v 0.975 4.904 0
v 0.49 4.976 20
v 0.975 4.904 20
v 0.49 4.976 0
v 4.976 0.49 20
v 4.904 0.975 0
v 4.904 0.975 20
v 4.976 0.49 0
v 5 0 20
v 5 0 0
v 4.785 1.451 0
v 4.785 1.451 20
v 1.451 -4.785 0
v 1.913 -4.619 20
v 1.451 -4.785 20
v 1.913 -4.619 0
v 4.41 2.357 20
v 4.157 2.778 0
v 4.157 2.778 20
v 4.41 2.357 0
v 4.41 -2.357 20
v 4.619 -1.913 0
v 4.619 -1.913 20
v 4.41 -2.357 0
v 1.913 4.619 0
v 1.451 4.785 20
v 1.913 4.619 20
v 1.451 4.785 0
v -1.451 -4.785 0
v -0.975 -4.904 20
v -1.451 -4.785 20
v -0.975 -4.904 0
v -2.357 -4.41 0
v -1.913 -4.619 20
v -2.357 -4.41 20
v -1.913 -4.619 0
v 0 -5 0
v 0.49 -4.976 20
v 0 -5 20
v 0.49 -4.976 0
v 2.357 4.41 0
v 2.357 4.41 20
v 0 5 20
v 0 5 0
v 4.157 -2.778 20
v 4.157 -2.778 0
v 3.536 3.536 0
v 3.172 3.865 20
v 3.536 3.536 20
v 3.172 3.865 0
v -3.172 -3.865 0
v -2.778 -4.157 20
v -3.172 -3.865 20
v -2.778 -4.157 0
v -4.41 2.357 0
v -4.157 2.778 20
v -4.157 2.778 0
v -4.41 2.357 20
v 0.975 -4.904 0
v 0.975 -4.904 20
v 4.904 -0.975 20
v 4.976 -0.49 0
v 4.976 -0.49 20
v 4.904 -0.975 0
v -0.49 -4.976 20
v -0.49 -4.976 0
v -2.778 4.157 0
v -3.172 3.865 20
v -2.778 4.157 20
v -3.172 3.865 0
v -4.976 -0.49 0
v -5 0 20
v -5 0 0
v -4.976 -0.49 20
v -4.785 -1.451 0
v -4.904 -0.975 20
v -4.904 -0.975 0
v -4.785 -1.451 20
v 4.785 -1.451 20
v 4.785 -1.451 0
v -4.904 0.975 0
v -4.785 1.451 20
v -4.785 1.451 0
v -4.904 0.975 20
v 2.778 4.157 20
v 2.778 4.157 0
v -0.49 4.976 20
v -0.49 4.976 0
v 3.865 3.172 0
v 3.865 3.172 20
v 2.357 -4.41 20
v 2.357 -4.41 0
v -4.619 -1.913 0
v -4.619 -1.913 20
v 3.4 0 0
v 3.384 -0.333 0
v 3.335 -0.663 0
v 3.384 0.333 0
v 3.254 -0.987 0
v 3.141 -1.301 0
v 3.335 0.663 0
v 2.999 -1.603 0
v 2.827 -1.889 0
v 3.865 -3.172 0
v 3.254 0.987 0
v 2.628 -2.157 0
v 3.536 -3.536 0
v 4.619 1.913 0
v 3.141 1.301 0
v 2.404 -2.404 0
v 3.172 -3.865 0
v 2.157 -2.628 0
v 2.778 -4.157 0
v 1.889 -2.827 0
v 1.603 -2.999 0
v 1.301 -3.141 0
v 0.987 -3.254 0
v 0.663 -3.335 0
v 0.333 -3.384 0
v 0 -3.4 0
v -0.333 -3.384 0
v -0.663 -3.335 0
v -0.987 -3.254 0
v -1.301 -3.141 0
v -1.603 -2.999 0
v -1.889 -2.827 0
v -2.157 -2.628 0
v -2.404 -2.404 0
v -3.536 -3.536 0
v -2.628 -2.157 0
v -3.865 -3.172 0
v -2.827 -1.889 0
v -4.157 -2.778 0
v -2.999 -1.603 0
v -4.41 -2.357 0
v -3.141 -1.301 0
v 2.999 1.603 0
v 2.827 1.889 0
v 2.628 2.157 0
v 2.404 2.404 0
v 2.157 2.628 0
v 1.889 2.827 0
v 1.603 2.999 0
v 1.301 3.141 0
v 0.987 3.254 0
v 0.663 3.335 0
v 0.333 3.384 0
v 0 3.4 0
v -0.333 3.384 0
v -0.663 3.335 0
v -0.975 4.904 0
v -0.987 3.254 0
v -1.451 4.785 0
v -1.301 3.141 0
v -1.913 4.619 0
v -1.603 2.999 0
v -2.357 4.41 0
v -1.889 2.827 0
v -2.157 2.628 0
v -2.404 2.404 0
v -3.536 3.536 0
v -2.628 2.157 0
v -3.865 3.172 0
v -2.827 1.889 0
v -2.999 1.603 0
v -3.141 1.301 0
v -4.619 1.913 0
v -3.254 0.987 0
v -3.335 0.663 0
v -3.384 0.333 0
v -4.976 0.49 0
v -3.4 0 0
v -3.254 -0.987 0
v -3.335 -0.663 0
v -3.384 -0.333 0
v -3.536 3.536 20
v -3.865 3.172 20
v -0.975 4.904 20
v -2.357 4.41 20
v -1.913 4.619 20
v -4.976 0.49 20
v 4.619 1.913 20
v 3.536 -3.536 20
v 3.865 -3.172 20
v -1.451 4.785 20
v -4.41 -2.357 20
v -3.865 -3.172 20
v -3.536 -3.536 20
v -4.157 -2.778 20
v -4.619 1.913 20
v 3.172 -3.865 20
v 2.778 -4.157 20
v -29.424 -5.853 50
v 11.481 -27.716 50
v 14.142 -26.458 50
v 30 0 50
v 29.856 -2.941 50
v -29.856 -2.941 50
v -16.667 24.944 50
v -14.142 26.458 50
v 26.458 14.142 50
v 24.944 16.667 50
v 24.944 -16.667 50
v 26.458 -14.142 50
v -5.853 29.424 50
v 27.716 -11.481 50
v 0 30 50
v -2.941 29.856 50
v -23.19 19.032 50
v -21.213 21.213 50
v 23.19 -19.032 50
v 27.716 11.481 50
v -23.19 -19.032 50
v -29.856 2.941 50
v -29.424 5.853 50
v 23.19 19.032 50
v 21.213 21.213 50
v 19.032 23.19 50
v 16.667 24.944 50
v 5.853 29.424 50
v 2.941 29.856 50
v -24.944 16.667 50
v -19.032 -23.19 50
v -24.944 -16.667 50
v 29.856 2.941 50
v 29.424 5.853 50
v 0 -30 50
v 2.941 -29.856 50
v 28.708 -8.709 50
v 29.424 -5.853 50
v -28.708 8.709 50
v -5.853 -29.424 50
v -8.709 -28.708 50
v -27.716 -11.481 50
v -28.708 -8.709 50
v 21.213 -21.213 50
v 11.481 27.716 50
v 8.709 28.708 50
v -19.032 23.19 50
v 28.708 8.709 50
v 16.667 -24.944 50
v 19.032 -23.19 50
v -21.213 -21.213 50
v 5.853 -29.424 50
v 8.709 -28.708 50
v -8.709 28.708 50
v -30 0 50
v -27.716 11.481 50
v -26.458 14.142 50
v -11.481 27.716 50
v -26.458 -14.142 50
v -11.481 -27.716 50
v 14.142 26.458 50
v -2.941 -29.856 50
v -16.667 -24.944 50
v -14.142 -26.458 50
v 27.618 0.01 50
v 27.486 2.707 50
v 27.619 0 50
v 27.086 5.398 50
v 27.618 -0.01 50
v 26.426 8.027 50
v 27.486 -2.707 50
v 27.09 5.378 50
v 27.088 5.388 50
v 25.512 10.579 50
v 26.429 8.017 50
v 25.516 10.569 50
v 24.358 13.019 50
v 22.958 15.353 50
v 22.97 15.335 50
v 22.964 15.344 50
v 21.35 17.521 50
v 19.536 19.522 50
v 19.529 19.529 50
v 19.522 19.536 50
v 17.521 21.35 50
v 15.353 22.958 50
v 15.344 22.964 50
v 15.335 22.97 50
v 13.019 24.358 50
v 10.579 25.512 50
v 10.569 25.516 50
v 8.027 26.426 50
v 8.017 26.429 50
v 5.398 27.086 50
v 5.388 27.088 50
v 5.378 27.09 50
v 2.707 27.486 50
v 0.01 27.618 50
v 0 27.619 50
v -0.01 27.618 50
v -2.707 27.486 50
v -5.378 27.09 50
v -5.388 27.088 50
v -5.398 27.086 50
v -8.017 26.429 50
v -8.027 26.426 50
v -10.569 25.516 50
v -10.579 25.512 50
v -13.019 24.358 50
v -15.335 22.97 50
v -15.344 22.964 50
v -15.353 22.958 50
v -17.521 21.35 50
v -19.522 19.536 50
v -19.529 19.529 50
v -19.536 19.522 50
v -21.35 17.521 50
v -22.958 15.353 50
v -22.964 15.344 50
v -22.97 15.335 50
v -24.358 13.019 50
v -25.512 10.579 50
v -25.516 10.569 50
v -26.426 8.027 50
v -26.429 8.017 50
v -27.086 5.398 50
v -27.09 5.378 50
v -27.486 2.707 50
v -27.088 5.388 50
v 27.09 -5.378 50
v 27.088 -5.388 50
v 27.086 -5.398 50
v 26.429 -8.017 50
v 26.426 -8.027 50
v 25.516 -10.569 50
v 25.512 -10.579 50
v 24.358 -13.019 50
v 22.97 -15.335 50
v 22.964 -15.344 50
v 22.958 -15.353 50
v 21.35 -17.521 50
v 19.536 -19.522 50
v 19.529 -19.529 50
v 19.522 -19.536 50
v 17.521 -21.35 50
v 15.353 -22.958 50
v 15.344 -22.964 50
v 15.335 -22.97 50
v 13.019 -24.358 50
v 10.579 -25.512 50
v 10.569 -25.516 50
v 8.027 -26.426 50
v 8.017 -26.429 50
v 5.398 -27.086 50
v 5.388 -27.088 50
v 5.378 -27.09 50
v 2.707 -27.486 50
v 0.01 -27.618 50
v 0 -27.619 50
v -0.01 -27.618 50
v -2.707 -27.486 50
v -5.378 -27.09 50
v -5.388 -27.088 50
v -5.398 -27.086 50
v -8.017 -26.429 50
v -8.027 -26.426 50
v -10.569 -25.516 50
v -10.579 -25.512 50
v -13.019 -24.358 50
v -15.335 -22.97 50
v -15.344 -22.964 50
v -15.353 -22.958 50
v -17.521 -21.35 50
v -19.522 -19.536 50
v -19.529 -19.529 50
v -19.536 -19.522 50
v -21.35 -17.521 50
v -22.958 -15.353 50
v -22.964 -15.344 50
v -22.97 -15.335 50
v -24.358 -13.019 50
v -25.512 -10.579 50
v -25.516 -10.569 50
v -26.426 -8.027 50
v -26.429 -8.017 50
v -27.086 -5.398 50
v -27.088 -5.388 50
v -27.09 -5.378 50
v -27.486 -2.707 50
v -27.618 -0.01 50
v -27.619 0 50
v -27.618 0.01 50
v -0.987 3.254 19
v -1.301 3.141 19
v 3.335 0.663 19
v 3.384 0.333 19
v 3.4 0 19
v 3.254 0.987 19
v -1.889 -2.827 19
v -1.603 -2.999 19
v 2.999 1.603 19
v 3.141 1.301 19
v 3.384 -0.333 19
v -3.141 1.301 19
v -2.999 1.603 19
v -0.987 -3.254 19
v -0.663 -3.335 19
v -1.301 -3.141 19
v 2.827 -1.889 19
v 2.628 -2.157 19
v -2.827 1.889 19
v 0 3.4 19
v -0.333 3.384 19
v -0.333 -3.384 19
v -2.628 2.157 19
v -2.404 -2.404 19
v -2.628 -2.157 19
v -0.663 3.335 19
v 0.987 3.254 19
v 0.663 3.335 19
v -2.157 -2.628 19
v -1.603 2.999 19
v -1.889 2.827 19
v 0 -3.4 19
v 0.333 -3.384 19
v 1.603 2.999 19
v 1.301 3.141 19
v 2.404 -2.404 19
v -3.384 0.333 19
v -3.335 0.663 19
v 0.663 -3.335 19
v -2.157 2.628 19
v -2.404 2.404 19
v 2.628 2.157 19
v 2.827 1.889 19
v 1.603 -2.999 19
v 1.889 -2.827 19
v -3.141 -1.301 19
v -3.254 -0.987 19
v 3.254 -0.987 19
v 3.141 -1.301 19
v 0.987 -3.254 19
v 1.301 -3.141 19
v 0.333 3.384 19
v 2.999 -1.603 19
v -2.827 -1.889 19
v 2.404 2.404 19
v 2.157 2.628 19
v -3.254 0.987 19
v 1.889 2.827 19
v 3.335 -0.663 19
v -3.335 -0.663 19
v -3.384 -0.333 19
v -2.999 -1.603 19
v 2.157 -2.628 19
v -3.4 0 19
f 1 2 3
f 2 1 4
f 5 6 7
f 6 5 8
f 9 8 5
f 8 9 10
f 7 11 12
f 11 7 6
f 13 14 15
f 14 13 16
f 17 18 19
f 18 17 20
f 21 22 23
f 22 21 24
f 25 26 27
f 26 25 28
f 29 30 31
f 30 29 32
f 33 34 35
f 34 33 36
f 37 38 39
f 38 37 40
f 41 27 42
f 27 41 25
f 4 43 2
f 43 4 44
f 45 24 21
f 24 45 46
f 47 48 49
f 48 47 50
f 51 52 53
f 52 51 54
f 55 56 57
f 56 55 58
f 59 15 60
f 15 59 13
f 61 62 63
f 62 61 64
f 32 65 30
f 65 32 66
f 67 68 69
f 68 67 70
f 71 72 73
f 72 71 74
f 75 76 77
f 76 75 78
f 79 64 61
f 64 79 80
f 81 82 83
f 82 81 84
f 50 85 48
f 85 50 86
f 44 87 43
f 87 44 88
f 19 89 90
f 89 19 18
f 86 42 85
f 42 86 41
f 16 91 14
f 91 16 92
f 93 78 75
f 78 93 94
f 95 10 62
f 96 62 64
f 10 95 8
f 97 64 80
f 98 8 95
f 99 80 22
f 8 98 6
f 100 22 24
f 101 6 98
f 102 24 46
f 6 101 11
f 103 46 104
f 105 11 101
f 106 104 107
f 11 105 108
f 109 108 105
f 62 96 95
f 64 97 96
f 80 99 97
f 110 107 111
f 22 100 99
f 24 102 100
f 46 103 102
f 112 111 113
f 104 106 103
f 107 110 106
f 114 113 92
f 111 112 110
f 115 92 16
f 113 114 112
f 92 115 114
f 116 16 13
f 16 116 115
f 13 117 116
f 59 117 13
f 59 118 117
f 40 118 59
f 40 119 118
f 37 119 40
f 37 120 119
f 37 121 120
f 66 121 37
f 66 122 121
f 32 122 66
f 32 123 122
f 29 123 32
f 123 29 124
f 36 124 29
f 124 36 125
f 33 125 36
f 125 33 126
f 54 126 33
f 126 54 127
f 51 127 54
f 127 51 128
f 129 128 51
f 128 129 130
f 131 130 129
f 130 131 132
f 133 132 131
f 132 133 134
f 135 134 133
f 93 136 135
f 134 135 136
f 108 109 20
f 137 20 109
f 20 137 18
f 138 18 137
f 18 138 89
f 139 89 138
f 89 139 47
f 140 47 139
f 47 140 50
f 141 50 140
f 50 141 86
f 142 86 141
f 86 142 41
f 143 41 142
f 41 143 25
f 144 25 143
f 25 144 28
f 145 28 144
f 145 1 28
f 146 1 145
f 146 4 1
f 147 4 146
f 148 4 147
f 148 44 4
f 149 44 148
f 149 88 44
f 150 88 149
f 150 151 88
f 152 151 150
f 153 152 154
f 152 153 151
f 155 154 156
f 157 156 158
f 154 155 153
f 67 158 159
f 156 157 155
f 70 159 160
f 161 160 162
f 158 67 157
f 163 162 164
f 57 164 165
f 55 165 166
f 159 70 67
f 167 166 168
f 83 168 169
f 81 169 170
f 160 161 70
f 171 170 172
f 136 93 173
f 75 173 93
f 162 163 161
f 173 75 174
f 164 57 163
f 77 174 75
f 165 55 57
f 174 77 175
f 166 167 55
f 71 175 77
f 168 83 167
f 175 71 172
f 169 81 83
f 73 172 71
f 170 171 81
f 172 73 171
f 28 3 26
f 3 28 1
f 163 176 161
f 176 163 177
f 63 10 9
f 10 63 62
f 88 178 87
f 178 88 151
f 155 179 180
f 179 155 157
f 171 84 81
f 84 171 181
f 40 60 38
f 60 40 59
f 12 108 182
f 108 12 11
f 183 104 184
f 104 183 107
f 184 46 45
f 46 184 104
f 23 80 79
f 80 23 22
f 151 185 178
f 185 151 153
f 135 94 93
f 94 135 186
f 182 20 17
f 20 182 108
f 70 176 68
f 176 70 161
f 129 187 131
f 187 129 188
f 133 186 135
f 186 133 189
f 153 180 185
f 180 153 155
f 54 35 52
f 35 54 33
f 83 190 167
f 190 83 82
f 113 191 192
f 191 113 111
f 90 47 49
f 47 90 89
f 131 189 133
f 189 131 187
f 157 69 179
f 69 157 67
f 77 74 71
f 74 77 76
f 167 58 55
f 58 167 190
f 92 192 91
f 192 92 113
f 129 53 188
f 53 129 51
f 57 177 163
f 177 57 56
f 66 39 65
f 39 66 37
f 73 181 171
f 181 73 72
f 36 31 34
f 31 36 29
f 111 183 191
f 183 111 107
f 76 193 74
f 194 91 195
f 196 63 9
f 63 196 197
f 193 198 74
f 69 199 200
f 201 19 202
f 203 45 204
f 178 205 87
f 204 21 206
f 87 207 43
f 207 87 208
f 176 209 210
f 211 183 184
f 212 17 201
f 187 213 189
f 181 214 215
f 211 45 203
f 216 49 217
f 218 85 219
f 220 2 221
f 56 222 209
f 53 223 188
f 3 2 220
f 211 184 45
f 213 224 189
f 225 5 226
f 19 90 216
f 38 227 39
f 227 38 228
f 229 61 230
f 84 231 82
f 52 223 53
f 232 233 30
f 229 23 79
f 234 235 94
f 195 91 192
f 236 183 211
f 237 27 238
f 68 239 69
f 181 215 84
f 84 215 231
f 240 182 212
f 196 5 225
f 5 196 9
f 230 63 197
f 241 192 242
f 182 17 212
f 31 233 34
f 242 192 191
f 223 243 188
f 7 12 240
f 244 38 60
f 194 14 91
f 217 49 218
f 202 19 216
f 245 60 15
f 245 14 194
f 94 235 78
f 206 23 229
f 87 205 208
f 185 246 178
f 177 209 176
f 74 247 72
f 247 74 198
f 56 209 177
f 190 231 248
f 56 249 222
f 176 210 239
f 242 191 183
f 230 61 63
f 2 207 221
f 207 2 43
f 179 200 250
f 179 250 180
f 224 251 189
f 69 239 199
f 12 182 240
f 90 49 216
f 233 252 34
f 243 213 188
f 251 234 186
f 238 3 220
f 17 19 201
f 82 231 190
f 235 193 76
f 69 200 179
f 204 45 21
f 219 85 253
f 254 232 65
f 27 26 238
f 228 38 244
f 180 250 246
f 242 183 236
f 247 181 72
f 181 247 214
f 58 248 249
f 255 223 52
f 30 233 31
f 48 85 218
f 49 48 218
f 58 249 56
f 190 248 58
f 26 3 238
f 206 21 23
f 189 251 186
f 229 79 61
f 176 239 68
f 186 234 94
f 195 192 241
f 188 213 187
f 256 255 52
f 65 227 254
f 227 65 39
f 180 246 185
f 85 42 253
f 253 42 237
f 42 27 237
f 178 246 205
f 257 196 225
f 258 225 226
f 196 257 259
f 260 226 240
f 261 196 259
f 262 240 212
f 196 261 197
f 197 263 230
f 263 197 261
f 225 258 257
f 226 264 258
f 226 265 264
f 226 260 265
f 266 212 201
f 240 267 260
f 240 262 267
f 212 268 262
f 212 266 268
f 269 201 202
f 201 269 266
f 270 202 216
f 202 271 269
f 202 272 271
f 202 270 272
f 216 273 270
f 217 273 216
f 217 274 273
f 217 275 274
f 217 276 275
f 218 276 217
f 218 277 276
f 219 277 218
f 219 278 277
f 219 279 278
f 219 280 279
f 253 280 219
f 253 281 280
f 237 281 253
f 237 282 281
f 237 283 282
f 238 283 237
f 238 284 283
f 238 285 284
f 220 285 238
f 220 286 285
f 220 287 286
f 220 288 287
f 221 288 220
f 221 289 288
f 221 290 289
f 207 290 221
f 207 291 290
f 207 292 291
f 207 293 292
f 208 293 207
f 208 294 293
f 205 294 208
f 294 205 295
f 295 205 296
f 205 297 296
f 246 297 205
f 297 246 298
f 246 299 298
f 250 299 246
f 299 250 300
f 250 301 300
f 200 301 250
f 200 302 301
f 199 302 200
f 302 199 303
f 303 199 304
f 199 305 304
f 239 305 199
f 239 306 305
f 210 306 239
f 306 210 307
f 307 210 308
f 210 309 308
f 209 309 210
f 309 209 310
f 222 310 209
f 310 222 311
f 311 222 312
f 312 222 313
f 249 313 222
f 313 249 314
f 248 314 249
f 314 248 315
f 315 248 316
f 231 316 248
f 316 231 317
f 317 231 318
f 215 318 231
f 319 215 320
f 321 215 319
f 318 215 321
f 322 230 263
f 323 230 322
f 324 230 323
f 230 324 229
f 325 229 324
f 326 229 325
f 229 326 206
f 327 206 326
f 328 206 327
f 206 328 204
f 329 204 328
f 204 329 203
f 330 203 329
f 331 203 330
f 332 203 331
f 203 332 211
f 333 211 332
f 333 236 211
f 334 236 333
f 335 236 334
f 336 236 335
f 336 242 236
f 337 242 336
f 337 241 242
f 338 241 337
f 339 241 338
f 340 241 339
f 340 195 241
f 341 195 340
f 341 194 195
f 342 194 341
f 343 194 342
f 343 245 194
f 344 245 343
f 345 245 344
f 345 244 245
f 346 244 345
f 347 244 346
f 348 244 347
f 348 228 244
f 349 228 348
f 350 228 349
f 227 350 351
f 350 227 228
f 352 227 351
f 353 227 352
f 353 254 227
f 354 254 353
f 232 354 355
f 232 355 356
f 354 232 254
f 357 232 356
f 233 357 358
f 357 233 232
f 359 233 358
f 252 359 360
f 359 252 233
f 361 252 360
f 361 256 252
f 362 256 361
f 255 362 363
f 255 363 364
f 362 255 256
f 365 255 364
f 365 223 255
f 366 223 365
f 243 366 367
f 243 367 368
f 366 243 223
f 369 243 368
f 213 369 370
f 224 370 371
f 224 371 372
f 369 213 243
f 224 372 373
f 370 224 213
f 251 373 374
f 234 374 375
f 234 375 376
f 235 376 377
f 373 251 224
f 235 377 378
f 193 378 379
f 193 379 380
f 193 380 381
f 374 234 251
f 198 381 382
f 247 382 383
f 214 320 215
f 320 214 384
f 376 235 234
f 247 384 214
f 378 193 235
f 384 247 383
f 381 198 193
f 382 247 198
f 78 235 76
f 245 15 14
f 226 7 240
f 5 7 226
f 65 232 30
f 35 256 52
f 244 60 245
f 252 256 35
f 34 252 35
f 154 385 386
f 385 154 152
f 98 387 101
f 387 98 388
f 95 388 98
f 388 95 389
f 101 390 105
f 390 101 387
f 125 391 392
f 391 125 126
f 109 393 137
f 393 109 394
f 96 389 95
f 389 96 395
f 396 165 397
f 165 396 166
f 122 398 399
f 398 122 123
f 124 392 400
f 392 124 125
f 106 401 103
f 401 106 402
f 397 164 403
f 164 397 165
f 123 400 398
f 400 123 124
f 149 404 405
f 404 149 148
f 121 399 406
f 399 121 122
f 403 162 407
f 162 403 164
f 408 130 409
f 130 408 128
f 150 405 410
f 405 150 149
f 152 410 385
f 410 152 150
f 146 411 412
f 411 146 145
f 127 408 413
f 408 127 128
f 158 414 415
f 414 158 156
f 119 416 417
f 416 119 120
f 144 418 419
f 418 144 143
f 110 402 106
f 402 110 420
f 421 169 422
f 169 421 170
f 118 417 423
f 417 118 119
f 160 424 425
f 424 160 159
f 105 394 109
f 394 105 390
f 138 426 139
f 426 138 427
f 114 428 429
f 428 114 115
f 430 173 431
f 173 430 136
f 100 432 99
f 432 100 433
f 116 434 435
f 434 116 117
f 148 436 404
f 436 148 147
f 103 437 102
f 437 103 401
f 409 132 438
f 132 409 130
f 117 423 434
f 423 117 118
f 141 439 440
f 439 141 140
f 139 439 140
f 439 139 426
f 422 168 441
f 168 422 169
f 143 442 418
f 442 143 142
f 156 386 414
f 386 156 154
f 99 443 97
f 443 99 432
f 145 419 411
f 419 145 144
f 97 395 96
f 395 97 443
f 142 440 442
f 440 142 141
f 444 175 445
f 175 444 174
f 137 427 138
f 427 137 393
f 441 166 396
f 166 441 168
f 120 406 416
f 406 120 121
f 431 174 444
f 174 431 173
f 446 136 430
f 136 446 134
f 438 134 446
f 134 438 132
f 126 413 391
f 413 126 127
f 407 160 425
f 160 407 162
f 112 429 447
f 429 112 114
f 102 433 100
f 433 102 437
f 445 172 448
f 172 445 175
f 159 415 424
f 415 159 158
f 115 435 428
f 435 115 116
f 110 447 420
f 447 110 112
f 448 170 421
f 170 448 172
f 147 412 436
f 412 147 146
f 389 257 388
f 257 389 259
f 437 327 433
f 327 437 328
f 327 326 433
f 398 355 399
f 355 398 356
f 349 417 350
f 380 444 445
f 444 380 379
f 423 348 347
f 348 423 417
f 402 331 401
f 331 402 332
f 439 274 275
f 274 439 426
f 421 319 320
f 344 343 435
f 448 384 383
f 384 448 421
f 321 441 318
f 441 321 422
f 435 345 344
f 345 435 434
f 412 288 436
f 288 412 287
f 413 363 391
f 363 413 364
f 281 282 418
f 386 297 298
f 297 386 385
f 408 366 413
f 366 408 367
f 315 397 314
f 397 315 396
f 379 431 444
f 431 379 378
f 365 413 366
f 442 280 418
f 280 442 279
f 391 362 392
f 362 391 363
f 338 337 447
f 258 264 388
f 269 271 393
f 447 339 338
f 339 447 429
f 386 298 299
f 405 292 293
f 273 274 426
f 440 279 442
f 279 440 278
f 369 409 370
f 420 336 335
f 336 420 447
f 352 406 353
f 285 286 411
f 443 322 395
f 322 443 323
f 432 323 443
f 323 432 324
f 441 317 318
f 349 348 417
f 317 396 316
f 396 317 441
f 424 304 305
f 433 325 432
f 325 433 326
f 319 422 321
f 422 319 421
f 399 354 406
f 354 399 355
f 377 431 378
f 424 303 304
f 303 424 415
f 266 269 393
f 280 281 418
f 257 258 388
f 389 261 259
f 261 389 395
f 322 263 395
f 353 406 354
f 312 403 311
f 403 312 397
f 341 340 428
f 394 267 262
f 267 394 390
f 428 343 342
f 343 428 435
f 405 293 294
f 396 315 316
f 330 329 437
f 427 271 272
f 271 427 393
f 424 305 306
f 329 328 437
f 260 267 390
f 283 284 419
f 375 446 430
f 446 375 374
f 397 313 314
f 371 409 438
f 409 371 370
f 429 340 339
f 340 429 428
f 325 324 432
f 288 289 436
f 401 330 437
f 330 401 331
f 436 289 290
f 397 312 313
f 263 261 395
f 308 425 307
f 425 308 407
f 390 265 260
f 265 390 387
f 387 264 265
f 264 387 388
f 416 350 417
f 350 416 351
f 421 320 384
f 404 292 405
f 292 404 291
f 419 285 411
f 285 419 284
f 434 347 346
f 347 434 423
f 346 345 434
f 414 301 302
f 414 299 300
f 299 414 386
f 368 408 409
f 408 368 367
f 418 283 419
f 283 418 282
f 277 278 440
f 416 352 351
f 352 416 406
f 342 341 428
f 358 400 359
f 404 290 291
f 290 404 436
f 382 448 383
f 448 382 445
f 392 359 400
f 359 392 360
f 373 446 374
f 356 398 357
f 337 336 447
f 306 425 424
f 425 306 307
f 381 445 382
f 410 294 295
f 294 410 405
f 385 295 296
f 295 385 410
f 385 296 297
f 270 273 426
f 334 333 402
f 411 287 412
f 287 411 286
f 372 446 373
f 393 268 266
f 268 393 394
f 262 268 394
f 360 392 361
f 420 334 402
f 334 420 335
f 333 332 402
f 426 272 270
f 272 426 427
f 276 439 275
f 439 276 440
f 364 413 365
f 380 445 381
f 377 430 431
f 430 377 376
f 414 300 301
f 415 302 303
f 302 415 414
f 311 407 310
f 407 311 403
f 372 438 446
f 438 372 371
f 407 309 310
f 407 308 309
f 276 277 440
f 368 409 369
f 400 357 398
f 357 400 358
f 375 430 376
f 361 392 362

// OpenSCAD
// Small lab funnel – printed upright, wide opening at top.
// All dimensions in mm, taken directly from the spec.

$fn = 64;

// ---- Named dimensions (measured with calipers) ----
spout_od   = 10;   // spout outer diameter
spout_h    = 20;   // spout height (z = 0 .. 20)
cone_od    = 60;   // cone outer diameter at the rim (z = 50)
cone_h     = 30;   // cone height (z = 20 .. 50)
wall       = 1.6;  // uniform wall thickness

// Derived values
spout_id   = spout_od - 2 * wall;   // 6.8 mm spout bore
cone_id    = cone_od  - 2 * wall;   // 56.8 mm inner rim diameter

// ---- Outer solid (spout cylinder + cone) ----
module outer() { union() {
    // Straight spout, z = 0 .. 20
    cylinder(h = spout_h, d = spout_od, center = false);
    // Cone, z = 20 .. 50 (10 mm OD at base -> 60 mm OD at rim)
    translate([0, 0, spout_h])
        cylinder(h = cone_h, d1 = spout_od, d2 = cone_od, center = false);
} }

// ---- Inner cavity (spout bore + cone bore), open at both ends ----
// Each cutter is extended 1 mm past the faces it cuts (no coplanar faces).
module inner() { union() {
    // Spout bore, extended 1 mm below z = 0 and 1 mm above z = 20
    cylinder(h = spout_h + 2, d = spout_id, center = false);
    // Cone bore, extended 1 mm below z = 20 and 1 mm above z = 50
    translate([0, 0, spout_h - 1])
        cylinder(h = cone_h + 2, d1 = spout_id, d2 = cone_id, center = false);
} }

// ---- Funnel = outer minus inner (open top and bottom) ----
difference() {
    outer();
    inner();
}
